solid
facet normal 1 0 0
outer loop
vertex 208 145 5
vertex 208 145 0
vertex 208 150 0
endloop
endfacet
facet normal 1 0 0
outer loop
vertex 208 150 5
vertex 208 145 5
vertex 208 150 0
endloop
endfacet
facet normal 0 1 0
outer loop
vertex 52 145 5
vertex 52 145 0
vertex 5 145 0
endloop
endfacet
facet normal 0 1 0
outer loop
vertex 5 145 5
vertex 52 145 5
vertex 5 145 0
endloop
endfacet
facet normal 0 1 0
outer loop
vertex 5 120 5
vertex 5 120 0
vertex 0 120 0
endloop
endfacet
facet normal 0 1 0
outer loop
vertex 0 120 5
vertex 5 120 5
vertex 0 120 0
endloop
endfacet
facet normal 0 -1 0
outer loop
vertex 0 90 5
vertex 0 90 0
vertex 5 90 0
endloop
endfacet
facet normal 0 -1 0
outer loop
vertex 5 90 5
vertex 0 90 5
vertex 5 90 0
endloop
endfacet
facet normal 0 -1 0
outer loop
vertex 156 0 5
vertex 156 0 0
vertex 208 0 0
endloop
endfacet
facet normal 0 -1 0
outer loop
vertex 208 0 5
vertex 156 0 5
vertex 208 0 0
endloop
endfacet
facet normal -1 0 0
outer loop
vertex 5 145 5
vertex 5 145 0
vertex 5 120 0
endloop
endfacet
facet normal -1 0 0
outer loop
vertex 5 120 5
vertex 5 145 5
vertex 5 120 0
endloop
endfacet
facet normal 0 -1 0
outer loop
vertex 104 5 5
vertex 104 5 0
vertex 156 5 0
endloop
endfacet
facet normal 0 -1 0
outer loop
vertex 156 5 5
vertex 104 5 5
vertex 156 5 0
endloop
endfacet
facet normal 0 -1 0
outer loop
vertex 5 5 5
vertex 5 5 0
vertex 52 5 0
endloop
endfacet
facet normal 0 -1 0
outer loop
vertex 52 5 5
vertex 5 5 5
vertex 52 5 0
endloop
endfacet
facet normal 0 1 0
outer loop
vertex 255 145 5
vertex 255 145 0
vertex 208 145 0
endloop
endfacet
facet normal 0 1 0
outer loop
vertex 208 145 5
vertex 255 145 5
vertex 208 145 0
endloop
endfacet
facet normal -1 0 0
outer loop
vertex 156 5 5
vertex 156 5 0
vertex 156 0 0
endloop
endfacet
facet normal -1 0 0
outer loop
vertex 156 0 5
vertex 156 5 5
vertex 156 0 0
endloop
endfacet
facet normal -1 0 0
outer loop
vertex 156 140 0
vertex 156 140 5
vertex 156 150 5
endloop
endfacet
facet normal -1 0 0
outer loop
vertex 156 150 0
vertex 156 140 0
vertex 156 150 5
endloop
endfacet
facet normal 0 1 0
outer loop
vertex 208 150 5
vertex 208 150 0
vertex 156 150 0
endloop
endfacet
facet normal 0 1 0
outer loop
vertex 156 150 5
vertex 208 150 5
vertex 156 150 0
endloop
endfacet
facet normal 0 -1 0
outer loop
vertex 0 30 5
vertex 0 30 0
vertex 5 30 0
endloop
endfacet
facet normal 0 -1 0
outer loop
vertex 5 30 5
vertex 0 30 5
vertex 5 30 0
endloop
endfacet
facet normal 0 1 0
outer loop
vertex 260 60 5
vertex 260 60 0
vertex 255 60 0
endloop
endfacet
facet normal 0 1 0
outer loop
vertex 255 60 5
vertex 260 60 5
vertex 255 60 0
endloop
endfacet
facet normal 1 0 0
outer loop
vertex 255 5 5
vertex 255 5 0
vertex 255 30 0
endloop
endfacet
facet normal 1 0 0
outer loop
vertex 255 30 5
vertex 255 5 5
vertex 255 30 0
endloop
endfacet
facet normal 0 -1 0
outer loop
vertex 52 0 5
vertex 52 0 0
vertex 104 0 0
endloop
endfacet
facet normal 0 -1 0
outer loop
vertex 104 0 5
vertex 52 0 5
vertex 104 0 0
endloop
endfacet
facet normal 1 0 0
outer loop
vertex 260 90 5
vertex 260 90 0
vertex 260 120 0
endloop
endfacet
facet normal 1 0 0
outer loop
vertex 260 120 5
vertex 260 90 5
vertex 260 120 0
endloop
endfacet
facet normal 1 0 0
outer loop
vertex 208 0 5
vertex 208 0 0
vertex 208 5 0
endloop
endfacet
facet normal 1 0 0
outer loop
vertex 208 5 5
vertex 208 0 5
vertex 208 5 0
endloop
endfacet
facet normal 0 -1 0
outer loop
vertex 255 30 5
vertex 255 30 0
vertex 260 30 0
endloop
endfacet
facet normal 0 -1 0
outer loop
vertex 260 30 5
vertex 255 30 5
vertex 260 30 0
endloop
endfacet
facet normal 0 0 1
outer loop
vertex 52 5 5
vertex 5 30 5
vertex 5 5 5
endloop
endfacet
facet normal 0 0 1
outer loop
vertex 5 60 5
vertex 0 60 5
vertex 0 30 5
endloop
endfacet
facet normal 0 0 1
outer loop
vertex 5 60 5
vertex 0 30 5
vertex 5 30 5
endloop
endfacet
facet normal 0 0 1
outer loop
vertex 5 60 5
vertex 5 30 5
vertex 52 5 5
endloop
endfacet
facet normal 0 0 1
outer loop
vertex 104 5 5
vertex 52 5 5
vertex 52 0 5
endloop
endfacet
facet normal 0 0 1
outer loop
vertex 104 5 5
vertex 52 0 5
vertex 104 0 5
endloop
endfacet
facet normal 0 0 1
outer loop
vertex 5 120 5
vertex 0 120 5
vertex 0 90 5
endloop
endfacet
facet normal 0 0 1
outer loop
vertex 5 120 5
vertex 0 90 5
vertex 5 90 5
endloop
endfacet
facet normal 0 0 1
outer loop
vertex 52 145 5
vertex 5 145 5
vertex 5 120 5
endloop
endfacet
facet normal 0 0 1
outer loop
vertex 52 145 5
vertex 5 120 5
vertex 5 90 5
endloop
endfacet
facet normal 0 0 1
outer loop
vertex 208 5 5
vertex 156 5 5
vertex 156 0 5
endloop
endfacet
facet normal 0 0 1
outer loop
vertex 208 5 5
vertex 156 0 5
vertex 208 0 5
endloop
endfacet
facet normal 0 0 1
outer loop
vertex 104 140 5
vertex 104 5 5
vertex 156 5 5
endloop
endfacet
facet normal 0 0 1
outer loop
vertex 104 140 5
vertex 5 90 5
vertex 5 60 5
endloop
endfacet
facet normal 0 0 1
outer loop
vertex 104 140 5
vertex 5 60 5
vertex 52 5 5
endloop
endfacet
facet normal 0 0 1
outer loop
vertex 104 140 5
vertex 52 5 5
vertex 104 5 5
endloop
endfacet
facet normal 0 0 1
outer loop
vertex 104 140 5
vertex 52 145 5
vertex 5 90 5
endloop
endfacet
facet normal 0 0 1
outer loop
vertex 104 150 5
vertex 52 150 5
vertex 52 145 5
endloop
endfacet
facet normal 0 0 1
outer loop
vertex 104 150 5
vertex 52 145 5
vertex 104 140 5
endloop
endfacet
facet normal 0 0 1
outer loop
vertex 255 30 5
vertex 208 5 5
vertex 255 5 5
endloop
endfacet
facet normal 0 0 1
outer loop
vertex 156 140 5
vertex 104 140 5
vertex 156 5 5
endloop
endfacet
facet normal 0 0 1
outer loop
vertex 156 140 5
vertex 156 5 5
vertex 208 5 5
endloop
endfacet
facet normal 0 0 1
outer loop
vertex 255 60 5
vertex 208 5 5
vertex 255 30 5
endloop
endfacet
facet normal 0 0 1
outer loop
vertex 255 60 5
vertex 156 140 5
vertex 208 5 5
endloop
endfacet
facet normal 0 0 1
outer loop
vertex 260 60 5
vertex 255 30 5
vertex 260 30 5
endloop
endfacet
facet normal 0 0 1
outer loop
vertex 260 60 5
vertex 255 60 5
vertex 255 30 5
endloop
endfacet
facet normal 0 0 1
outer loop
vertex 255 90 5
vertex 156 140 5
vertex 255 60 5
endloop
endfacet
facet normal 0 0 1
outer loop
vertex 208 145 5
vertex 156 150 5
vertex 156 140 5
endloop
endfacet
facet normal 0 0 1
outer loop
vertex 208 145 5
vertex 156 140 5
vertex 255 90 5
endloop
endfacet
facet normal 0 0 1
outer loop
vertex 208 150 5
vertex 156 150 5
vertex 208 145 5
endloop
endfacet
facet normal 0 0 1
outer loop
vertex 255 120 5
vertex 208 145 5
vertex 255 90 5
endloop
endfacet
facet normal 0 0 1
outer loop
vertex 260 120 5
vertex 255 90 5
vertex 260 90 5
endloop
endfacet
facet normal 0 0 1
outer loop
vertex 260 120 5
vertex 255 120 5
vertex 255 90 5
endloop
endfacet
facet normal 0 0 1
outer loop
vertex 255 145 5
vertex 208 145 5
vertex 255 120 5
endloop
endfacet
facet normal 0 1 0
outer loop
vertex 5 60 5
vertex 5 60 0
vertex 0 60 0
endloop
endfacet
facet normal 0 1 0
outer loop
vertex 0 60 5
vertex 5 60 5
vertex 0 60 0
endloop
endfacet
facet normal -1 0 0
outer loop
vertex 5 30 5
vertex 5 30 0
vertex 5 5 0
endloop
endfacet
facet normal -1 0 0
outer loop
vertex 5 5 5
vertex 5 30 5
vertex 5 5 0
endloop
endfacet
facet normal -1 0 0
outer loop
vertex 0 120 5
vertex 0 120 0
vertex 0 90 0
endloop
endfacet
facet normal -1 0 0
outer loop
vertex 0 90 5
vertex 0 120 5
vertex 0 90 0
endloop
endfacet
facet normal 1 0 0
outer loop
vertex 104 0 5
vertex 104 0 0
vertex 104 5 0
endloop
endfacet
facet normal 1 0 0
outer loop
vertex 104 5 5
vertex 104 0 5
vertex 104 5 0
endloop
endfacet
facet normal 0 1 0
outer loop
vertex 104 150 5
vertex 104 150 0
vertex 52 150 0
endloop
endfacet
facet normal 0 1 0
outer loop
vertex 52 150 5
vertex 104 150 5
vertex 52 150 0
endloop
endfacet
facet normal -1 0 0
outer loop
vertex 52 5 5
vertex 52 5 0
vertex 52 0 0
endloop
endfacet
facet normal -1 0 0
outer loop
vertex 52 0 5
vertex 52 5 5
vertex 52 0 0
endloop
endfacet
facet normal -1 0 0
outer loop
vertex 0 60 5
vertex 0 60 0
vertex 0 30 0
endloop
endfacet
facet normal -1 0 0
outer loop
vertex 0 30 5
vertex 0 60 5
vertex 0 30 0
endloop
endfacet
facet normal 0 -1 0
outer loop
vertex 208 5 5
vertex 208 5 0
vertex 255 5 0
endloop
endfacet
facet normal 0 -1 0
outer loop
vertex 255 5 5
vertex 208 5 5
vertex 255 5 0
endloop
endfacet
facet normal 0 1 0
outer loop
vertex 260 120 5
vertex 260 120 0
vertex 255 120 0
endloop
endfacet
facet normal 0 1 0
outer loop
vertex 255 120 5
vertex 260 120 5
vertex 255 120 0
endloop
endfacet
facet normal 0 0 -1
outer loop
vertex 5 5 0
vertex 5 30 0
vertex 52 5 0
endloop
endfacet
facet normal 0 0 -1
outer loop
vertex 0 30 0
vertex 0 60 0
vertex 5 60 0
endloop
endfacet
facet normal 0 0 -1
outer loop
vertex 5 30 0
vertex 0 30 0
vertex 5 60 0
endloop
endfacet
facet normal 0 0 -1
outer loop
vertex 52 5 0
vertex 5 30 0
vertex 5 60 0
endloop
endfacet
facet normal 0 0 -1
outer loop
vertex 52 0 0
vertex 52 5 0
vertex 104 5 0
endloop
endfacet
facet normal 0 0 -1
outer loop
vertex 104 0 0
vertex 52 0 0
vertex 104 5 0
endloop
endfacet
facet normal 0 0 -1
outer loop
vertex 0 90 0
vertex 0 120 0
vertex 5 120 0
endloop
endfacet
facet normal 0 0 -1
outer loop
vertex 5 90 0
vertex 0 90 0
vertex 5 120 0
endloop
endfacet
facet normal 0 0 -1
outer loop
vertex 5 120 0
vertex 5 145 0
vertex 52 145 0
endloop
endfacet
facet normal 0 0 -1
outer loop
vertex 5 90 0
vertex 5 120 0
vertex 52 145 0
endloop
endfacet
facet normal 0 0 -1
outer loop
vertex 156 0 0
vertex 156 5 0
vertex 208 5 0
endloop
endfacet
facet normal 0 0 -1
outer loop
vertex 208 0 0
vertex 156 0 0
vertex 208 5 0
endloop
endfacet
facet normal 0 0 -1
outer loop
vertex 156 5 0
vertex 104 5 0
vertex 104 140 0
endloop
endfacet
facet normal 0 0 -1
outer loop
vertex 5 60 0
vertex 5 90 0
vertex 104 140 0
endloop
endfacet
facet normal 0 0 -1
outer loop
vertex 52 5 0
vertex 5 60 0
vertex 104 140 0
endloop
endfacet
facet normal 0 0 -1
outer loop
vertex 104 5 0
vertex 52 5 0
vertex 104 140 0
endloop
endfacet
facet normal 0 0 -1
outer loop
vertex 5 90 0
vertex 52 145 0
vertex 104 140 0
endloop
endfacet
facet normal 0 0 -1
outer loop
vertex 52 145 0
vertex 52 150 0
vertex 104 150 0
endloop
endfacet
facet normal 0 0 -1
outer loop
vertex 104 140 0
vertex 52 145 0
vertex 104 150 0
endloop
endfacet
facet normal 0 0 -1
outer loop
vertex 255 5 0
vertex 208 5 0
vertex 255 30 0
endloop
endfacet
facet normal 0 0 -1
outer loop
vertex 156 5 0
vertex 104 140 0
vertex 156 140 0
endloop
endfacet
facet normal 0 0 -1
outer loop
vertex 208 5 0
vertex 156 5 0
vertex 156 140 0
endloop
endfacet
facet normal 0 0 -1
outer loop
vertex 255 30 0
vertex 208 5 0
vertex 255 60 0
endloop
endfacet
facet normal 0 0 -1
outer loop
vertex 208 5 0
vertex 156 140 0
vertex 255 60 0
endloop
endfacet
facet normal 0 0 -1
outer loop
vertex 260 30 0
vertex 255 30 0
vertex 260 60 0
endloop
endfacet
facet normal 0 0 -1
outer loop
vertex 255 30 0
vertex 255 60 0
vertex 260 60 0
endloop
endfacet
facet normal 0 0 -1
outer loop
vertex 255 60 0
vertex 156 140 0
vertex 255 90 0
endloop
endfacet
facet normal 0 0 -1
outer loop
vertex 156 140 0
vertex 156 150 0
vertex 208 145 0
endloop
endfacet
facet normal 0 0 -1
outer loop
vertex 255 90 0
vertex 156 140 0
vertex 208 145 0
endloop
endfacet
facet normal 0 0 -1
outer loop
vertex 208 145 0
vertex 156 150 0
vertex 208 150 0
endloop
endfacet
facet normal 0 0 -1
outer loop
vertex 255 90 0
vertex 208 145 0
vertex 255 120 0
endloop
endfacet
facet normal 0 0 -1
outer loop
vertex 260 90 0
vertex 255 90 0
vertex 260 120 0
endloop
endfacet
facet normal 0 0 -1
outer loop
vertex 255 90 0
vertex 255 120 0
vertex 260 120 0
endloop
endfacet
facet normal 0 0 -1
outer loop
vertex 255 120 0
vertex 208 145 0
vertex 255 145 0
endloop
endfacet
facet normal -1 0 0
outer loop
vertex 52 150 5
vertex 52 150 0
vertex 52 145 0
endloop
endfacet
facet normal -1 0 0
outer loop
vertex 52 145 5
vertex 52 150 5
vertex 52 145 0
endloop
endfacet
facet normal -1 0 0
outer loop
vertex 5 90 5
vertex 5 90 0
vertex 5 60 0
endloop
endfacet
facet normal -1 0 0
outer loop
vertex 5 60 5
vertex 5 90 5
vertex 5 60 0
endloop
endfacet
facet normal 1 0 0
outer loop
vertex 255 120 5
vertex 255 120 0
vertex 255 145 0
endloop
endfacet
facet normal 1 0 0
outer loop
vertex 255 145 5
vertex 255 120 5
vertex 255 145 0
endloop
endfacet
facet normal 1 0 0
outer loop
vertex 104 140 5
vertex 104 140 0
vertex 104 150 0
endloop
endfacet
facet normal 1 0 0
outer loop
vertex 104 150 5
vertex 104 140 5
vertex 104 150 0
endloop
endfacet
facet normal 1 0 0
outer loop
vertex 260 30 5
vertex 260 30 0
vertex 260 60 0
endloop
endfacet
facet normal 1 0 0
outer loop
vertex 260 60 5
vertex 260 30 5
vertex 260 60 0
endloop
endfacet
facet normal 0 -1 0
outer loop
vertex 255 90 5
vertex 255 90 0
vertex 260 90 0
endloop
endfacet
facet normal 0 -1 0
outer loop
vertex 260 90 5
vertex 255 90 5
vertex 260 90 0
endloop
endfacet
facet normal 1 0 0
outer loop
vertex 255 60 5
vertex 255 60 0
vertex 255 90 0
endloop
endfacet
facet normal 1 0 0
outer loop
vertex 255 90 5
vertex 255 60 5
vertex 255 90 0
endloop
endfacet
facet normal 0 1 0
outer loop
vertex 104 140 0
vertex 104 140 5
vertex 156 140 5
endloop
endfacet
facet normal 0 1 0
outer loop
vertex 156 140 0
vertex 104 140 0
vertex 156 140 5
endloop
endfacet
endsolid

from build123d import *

# Parameters (mm, degrees)
SALIENTE_EXTRUIR1_DEPTH = 5
CROQUIS2_W              = 52
CROQUIS2_H              = 5
CORTAR_EXTRUIR1_DEPTH   = 10


with BuildPart() as part:
    # Croquis1 → Saliente-Extruir1 (new body)
    with BuildSketch(Plane.XY):
        Polygon((52, 0), (104, 0), (104, 5), (156, 5), (156, 0), (208, 0), (208, 5), (255, 5), (255, 30), (260, 30), (260, 60), (255, 60), (255, 90), (260, 90), (260, 120), (255, 120), (255, 145), (208, 145), (208, 150), (156, 150), (156, 145), (104, 145), (104, 150), (52, 150), (52, 145), (5, 145), (5, 120), (0, 120), (0, 90), (5, 90), (5, 60), (0, 60), (0, 30), (5, 30), (5, 5), (52, 5), align=None)
    extrude(amount=SALIENTE_EXTRUIR1_DEPTH)

    # Croquis2 → Cortar-Extruir1 (cut)
    with BuildSketch(Plane.XY.offset(5)):
        with Locations((130, 142.5)):
            Rectangle(CROQUIS2_W, CROQUIS2_H)
    extrude(amount=-CORTAR_EXTRUIR1_DEPTH, mode=Mode.SUBTRACT)


solid = part.part
